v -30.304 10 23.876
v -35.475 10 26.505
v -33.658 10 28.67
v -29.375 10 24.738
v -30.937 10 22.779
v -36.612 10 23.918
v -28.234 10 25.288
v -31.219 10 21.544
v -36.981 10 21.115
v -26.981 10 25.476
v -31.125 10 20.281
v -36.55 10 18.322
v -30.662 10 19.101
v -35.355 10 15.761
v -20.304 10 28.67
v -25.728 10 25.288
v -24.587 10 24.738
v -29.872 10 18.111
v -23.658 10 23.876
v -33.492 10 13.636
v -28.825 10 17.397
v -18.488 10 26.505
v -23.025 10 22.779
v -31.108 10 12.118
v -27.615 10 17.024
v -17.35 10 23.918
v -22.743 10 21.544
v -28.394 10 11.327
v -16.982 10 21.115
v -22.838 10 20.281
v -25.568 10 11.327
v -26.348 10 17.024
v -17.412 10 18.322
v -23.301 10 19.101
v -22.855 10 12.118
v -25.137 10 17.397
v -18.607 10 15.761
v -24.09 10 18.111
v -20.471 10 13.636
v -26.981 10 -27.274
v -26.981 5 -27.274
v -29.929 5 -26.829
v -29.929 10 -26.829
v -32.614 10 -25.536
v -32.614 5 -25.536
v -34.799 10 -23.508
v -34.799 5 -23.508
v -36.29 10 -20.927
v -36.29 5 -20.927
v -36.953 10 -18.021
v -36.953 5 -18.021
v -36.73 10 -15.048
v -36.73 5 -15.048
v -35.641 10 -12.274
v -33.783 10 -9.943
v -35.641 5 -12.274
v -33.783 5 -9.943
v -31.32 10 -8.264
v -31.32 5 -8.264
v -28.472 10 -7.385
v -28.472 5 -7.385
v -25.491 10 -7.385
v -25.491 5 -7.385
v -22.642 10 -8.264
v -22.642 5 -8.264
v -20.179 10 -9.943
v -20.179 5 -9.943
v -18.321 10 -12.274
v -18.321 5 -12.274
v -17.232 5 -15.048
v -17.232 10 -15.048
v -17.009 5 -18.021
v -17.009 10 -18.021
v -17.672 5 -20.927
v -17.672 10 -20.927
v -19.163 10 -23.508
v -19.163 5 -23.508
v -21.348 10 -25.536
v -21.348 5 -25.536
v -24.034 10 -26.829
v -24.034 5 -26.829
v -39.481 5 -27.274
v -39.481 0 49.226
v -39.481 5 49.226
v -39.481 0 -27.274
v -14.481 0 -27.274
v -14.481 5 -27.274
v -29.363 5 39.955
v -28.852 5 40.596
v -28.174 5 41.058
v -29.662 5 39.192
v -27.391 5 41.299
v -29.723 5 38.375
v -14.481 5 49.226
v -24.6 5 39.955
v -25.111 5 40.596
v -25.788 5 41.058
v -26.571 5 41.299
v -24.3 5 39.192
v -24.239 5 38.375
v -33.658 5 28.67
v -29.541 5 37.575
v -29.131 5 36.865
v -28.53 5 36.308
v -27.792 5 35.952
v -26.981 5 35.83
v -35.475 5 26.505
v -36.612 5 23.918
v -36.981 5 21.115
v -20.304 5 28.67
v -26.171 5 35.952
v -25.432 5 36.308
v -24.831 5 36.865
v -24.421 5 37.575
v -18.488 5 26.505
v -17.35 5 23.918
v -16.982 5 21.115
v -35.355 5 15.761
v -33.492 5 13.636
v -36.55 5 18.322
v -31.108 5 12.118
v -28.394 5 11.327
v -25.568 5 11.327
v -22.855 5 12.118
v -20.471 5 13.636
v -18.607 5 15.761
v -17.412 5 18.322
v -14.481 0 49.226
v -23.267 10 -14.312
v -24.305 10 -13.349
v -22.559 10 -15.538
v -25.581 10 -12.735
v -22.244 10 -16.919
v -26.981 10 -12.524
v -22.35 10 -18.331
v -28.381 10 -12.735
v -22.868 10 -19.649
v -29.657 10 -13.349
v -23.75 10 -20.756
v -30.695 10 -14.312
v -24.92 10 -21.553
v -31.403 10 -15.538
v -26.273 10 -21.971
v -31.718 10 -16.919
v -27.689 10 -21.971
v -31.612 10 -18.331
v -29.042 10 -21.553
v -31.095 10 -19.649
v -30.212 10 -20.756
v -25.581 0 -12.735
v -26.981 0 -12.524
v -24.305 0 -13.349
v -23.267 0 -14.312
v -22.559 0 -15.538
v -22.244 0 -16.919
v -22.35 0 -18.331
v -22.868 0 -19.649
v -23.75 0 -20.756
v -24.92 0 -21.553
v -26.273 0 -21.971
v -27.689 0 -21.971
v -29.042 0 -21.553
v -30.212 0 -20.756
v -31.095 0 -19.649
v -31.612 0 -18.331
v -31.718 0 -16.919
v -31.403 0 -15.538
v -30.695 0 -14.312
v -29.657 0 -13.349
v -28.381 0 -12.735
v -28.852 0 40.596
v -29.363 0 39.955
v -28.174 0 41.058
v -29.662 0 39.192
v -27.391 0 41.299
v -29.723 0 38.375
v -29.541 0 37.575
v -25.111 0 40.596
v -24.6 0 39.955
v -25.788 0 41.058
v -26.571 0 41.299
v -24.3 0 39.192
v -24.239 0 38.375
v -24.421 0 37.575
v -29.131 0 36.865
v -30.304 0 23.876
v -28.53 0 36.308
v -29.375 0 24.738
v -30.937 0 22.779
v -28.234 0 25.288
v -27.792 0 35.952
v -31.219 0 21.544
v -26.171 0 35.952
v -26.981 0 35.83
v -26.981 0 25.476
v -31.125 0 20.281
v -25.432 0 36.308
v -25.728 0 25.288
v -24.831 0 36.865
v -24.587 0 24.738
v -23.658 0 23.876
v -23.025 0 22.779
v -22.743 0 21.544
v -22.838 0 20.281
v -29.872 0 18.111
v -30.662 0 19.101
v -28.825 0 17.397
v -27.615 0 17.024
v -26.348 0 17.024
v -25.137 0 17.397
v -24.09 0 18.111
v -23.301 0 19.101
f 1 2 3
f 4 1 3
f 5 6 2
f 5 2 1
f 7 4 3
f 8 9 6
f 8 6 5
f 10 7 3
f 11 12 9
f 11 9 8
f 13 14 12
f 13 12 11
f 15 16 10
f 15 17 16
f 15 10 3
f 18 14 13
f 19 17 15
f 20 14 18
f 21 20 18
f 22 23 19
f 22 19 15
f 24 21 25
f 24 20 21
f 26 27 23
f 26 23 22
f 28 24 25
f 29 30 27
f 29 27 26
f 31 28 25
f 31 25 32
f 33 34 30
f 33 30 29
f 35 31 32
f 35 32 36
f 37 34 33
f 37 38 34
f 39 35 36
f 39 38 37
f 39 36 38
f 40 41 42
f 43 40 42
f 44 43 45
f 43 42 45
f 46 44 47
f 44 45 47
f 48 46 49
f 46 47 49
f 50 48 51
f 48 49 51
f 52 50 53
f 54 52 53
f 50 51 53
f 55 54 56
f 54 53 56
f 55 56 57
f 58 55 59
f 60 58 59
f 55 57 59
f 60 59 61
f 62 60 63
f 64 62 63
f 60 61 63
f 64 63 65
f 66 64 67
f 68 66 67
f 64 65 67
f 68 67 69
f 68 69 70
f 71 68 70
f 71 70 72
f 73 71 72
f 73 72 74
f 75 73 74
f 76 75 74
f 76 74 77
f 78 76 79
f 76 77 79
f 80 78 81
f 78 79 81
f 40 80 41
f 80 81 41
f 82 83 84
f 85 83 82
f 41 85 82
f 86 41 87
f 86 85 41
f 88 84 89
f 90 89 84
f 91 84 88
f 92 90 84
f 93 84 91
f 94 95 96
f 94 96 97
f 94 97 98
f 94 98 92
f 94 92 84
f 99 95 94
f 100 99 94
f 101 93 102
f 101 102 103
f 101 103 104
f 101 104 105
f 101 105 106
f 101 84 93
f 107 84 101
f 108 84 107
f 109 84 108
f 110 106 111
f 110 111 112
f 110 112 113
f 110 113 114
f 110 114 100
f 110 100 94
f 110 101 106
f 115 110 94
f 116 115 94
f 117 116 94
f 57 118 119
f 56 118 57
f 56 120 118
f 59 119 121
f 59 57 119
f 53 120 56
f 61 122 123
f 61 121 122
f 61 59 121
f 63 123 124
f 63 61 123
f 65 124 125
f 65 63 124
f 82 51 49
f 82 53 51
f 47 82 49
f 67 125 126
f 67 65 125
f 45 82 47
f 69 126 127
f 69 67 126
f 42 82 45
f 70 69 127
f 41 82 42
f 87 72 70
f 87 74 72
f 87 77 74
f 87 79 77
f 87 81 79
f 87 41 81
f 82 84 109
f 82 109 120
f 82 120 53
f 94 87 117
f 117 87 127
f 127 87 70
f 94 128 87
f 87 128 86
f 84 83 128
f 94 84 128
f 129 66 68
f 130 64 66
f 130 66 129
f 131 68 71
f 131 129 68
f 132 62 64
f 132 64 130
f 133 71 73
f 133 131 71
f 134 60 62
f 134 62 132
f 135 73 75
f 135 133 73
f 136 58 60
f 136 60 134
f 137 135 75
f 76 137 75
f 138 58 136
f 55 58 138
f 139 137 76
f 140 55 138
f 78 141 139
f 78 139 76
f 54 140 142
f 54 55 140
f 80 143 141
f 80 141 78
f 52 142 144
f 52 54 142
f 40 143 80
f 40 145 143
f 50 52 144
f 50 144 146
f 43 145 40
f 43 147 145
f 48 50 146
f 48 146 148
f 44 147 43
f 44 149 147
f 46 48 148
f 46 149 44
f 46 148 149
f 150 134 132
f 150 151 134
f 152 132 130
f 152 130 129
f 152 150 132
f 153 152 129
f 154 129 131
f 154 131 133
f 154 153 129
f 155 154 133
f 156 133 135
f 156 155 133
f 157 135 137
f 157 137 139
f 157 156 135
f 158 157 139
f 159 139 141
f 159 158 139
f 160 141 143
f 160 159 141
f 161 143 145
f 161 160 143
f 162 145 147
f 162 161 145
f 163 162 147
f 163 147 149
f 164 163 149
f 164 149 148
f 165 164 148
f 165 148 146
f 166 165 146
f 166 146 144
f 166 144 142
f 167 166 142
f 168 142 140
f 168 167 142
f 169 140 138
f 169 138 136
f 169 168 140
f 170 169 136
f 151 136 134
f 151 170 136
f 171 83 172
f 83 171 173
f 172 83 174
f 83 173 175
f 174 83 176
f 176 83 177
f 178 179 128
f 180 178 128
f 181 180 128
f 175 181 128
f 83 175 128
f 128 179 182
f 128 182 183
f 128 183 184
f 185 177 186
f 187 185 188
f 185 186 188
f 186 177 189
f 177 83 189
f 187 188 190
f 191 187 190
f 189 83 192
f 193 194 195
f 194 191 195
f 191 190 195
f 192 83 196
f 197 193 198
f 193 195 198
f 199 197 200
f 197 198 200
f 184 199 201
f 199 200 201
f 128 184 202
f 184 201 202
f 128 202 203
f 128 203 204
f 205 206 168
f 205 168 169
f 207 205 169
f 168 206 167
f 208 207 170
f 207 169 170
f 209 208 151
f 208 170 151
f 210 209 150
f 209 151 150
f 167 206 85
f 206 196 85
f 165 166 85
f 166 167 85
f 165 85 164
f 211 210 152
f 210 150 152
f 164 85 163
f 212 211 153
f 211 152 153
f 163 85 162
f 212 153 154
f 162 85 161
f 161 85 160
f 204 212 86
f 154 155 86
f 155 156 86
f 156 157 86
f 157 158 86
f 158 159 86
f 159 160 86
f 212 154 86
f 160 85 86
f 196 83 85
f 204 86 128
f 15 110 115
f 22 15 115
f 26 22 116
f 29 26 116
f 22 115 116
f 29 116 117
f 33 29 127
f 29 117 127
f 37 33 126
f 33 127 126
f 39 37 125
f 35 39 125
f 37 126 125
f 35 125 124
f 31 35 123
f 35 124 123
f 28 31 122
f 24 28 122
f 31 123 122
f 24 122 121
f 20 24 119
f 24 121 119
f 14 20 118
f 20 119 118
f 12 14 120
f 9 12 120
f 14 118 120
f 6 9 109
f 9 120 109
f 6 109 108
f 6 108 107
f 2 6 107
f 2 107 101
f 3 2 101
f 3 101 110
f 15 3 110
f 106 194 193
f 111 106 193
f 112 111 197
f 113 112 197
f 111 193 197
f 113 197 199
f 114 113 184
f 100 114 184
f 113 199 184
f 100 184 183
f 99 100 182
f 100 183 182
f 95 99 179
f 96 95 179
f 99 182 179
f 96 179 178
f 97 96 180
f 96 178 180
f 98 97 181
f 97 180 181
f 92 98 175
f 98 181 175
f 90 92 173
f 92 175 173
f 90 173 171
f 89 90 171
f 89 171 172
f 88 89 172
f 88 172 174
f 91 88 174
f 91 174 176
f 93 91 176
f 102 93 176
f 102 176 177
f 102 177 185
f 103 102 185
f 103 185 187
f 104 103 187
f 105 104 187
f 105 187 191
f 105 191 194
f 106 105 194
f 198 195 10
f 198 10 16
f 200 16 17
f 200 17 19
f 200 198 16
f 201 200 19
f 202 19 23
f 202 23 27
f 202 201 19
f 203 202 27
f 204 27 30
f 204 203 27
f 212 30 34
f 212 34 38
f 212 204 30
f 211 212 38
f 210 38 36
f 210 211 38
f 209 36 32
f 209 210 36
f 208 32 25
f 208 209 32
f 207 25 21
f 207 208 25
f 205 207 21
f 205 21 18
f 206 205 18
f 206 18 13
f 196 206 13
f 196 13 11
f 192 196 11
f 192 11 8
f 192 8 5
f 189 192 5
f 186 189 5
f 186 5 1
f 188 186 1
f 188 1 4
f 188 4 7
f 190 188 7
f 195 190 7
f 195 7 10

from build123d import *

# Parameters (mm, degrees)
SKETCH_1_W          = 25
SKETCH_1_H          = 76.5
SKETCH_1_R          = 4.75
SKETCH_1_R_2        = 4.25
EXTRUDE_1_DEPTH     = 5
SKETCH_2_R          = 2.75
CUT_EXTRUDE_1_DEPTH = 64.300866763
SKETCH_3_R          = 10
SKETCH_3_R_2        = 4.75
SKETCH_3_R_3        = 4.25
EXTRUDE_2_DEPTH     = 5


with BuildPart() as part:
    # 草图1 → 凸台-拉伸1 (new body)
    with BuildSketch(Plane(origin=(0, 0, 0), x_dir=(1, 0, 0), z_dir=(0, 1, 0))):
        with Locations((-26.981132075, -10.976415094)):
            Rectangle(SKETCH_1_W, SKETCH_1_H)
        with Locations(Location((-26.981132075, 17.273584906, 0), (0, 0, 270))):
            Circle(SKETCH_1_R, mode=Mode.SUBTRACT)
        with Locations(Location((-26.981132075, -21.226415094, 0), (0, 0, 270))):
            Circle(SKETCH_1_R_2, mode=Mode.SUBTRACT)
    extrude(amount=EXTRUDE_1_DEPTH)

    # 草图2 → 切除-拉伸1 (cut, through all)
    with BuildSketch(Plane(origin=(0, 0, 0), x_dir=(-1, 0, 0), z_dir=(0, -1, 0))):
        with Locations(Location((26.981132075, -38.580008519, 0), (0, 0, 90))):
            Circle(SKETCH_2_R)
    extrude(amount=-CUT_EXTRUDE_1_DEPTH, mode=Mode.SUBTRACT)

    # 草图3 → 凸台-拉伸2 (add)
    # profile 1 of 2: a face of its own
    with BuildSketch(Plane(origin=(0, 5, 0), x_dir=(1, 0, 0), z_dir=(0, 1, 0))):
        with Locations(Location((-26.981132075, 17.273584906, 0), (0, 0, 90))):
            Circle(SKETCH_3_R)
        with Locations(Location((-26.981132075, 17.273584906, 0), (0, 0, 270))):
            Circle(SKETCH_3_R_2, mode=Mode.SUBTRACT)
    # profile 2 of 2: a face of its own
    with BuildSketch(Plane(origin=(0, 5, 0), x_dir=(1, 0, 0), z_dir=(0, 1, 0))):
        with BuildLine():
            Line((-33.65845117, -28.670433479), (-20.303812981, -28.670433479))
            ThreePointArc((-20.303812981, -28.670433479), (-26.981132075, -11.226415094), (-33.65845117, -28.670433479))
        make_face()
        with Locations(Location((-26.981132075, -21.226415094, 0), (0, 0, 270))):
            Circle(SKETCH_3_R_3, mode=Mode.SUBTRACT)
    extrude(amount=EXTRUDE_2_DEPTH)


solid = part.part
